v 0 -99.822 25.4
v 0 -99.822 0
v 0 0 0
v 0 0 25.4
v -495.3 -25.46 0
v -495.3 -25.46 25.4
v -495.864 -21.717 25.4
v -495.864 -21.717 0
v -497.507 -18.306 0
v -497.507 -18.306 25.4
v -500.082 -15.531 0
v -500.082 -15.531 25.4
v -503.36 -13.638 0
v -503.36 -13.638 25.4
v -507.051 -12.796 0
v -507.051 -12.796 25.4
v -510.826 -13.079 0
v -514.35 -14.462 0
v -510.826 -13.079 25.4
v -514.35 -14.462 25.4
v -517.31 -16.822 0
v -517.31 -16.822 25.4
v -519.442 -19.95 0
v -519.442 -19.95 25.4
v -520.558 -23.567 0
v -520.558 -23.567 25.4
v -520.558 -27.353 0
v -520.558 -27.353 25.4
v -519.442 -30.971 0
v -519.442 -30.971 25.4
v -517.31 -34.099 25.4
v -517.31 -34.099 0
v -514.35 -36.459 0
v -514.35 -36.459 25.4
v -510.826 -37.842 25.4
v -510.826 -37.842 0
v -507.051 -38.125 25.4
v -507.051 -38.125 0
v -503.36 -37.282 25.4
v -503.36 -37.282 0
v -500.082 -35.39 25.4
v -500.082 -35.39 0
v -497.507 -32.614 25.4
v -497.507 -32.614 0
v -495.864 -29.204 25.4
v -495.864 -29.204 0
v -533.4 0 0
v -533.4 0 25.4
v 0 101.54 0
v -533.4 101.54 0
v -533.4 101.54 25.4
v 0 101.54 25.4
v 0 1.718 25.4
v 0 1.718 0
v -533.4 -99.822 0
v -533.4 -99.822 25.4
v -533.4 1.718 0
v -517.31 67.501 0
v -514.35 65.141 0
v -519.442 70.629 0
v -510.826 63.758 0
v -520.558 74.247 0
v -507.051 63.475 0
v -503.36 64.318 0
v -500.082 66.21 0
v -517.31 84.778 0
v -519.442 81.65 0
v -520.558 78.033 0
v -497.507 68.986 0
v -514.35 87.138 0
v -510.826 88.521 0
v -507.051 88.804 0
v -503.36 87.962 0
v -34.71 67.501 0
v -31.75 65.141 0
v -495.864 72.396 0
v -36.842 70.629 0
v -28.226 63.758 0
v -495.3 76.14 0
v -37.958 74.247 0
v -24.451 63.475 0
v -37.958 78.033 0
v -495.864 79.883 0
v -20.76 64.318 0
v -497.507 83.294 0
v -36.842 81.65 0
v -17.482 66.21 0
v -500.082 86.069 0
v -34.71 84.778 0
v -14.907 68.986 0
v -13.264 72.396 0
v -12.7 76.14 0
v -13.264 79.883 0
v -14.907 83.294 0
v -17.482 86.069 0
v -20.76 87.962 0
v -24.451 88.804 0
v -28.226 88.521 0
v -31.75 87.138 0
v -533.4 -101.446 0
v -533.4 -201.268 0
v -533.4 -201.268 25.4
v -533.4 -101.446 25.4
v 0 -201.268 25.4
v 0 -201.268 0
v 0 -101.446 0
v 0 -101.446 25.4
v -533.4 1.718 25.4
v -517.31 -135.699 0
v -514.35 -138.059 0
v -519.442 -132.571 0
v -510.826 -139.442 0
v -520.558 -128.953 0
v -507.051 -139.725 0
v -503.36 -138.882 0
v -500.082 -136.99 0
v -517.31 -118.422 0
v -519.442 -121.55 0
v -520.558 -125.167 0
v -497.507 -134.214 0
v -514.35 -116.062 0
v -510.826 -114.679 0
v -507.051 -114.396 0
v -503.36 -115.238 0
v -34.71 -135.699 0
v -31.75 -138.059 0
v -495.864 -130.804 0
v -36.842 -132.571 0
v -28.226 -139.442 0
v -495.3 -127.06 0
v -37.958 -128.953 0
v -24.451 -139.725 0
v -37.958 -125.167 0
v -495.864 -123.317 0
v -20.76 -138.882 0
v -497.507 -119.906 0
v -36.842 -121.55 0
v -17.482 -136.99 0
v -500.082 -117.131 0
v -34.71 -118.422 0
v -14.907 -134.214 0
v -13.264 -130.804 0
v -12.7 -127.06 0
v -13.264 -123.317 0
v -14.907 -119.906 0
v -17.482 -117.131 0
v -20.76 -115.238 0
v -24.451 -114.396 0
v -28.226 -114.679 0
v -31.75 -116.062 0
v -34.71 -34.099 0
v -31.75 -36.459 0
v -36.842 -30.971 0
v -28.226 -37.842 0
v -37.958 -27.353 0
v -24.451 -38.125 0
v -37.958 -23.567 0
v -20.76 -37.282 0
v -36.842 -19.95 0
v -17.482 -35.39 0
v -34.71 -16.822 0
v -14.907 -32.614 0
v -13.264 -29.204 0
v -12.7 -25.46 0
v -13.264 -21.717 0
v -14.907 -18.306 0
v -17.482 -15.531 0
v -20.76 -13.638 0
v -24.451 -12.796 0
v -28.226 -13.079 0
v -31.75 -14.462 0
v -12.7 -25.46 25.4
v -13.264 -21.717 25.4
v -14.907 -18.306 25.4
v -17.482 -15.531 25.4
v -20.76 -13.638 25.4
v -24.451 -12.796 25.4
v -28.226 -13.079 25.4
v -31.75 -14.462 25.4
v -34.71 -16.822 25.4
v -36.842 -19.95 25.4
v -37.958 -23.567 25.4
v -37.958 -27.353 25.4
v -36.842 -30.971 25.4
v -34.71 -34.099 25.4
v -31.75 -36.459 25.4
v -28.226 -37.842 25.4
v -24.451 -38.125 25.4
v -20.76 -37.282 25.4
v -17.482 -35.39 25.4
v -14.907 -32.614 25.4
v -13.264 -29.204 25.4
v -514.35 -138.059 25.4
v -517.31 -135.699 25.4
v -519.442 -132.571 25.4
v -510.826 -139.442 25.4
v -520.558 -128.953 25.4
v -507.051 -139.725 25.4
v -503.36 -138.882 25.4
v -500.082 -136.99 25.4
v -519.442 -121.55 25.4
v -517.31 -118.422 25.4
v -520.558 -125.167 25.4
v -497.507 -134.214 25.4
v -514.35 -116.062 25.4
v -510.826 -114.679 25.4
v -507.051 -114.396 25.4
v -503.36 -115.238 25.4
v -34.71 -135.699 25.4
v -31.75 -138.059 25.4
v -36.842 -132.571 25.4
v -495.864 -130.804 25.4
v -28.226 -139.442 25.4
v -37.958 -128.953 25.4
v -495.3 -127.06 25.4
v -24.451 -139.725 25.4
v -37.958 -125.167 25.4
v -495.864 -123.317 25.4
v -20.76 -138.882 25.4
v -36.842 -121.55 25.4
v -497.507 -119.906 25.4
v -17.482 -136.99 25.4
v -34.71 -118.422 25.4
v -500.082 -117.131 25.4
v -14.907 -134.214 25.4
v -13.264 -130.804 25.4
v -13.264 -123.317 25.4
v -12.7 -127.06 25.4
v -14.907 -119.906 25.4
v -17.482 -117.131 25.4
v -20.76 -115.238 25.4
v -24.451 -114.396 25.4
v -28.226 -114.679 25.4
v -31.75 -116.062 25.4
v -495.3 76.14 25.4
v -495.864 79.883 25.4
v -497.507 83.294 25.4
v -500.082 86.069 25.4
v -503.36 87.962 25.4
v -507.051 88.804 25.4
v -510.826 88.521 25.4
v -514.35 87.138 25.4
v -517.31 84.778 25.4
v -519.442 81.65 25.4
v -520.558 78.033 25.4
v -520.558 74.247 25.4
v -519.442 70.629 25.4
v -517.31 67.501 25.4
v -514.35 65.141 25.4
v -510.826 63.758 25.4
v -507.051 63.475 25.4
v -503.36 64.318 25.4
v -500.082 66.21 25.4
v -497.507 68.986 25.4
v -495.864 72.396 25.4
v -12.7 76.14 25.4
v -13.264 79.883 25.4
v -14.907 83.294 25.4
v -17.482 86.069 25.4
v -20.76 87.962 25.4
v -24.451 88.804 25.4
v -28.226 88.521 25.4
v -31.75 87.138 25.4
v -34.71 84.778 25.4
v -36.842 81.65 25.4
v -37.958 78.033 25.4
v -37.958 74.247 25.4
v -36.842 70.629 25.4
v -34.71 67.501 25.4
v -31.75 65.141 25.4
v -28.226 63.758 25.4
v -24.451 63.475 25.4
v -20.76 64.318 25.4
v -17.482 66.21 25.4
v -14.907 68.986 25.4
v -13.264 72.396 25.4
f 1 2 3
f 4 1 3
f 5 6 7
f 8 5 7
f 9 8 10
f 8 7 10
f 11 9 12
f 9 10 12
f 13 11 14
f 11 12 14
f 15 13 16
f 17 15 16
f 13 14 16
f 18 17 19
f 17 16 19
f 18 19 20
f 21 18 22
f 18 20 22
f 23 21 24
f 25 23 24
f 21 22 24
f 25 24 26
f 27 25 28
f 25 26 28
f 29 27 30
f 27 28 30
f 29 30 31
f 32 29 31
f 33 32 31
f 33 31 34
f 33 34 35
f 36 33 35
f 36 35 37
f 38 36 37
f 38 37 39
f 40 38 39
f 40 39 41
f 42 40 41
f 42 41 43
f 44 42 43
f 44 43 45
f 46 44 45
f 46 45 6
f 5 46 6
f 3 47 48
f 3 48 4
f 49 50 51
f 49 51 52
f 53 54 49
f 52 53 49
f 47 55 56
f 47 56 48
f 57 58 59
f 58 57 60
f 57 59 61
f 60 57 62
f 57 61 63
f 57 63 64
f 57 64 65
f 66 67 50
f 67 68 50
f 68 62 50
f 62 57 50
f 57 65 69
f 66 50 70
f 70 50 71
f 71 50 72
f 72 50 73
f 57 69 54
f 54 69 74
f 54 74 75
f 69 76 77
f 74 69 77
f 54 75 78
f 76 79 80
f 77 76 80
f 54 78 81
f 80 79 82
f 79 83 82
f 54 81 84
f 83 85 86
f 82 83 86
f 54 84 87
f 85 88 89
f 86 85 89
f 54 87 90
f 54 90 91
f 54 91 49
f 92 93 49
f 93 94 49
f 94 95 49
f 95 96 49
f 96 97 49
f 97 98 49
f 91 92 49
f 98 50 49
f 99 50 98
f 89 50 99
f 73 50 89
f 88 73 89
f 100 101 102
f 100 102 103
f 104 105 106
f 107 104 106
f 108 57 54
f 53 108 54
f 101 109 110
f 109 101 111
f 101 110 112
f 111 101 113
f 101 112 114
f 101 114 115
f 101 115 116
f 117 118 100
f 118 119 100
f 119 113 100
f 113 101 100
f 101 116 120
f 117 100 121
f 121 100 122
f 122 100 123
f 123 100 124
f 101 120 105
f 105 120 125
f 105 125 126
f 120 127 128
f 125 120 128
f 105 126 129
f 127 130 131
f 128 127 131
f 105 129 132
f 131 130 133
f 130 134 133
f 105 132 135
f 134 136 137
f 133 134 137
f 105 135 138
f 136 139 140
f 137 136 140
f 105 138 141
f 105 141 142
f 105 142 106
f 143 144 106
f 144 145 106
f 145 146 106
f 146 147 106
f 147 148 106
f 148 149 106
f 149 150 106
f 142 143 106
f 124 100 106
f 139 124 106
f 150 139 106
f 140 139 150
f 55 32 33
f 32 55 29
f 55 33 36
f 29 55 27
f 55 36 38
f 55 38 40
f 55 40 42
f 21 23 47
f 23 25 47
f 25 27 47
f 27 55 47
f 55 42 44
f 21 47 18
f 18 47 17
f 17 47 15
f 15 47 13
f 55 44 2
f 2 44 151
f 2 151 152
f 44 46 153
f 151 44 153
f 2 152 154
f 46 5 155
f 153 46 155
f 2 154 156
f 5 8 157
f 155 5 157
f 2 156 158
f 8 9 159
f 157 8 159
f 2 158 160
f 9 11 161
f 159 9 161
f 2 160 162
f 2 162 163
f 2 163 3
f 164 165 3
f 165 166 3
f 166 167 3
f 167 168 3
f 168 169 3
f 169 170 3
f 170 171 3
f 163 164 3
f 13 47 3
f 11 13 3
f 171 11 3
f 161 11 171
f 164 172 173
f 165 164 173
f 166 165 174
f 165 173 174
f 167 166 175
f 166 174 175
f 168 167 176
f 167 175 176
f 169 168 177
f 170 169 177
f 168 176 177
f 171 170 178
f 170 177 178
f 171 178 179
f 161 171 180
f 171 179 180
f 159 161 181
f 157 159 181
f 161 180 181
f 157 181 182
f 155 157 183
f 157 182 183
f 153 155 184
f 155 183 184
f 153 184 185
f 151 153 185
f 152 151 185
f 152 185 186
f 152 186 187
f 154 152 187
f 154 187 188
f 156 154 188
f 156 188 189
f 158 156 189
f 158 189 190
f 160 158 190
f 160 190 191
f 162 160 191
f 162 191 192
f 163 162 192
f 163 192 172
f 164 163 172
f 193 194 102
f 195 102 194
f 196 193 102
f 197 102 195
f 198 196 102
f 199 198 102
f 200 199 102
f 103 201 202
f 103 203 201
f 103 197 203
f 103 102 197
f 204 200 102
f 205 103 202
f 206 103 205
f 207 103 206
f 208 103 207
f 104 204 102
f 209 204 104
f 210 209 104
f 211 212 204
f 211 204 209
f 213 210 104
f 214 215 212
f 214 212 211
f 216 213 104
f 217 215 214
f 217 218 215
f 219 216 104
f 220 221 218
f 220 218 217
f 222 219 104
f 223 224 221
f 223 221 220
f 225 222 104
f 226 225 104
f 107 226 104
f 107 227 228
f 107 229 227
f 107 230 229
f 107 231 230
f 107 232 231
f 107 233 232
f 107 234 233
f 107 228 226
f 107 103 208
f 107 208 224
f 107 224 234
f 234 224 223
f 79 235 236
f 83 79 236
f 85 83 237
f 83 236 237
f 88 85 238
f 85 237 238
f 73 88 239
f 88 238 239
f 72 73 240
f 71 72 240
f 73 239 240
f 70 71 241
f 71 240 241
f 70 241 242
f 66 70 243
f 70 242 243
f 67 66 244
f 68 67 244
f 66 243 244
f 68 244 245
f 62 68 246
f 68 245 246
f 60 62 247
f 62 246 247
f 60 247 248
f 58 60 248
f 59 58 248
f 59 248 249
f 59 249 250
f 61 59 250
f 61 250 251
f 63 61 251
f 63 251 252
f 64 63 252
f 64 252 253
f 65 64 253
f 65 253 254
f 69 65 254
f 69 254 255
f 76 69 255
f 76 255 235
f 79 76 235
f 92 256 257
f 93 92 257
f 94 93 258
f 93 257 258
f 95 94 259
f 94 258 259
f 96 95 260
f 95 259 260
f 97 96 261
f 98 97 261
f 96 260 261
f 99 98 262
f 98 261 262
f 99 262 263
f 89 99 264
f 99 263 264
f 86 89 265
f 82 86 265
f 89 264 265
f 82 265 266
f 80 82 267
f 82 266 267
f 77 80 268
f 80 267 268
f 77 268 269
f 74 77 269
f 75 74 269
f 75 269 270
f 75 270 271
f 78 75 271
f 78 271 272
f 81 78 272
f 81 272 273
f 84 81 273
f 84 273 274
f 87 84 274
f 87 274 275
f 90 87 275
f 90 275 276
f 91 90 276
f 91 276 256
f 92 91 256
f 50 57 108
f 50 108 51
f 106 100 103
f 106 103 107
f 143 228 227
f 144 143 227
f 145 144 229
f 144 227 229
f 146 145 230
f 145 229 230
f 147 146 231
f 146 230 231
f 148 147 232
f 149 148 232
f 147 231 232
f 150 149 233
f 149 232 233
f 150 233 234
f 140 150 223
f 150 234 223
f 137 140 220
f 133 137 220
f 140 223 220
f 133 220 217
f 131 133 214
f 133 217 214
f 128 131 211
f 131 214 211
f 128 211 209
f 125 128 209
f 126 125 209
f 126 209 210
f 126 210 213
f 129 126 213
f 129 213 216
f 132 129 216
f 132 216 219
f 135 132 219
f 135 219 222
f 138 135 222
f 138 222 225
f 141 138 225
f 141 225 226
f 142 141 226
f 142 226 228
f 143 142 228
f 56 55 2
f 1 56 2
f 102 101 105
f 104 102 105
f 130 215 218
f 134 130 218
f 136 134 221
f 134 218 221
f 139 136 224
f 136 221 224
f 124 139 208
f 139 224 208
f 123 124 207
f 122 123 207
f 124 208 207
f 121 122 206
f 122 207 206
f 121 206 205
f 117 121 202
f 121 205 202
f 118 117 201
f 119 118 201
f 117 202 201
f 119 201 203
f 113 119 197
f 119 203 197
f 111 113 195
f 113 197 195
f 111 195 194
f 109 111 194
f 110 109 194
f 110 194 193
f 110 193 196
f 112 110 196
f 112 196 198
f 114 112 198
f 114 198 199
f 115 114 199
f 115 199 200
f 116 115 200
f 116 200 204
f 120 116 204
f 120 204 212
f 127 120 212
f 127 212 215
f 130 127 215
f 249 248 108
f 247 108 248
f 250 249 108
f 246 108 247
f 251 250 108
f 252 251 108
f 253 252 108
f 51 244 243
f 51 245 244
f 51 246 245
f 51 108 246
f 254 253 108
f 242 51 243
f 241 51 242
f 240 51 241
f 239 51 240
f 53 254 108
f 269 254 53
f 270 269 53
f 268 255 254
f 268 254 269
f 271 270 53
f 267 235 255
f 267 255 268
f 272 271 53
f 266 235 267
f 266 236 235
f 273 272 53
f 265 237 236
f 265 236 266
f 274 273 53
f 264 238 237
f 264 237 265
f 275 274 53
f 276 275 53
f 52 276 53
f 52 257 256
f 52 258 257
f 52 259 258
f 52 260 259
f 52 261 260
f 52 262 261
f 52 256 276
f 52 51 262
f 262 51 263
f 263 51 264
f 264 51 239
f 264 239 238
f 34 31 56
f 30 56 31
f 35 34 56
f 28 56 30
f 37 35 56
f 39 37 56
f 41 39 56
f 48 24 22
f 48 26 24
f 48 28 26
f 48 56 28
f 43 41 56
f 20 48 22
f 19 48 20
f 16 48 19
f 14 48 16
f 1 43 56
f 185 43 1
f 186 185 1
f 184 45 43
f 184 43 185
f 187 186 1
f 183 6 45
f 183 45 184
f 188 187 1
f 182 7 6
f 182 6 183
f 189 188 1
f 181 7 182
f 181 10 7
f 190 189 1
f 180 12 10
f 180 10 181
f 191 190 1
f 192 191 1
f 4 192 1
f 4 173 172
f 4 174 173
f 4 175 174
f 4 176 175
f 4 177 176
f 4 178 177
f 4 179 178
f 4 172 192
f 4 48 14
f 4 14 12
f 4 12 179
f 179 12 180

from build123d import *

# Parameters (mm, degrees)
SKETCH1_W             = 533.4
SKETCH1_H             = 99.822
BOSS_EXTRUDE1_DEPTH   = 25.4
BOSS_EXTRUDE1_2_DEPTH = 25.4
BOSS_EXTRUDE1_3_DEPTH = 25.4
SKETCH2_R             = 12.7
CUT_EXTRUDE1_DEPTH    = 26.4
LPATTERN1_COUNT       = 3
LPATTERN1_PITCH       = 101.6


with BuildPart() as part:
    # Sketch1 → Boss-Extrude1 (new body)
    with BuildSketch(Plane.XY):
        with Locations((-266.7, -49.911)):
            Rectangle(SKETCH1_W, SKETCH1_H)
    extrude(amount=BOSS_EXTRUDE1_DEPTH)


with BuildPart() as body_2:
    # Sketch1 → Boss-Extrude1 2 (new body)
    with BuildSketch(Plane.XY):
        with Locations((-266.7, 51.628691072)):
            Rectangle(SKETCH1_W, SKETCH1_H)
    extrude(amount=BOSS_EXTRUDE1_2_DEPTH)

    # Sketch2 → Cut-Extrude1 (cut, through all)
    with BuildSketch(Plane.XY.offset(25.4)):
        with Locations((-508, 76.139691072)):
            Circle(SKETCH2_R)
        with Locations((-25.4, 76.139691072)):
            Circle(SKETCH2_R)
    cut_extrude1 = extrude(amount=-CUT_EXTRUDE1_DEPTH, mode=Mode.SUBTRACT)


with BuildPart() as body_3:
    # Sketch1 → Boss-Extrude1 3 (new body)
    with BuildSketch(Plane.XY):
        with Locations((-266.7, -151.356836193)):
            Rectangle(SKETCH1_W, SKETCH1_H)
    extrude(amount=BOSS_EXTRUDE1_3_DEPTH)


with BuildPart() as lpattern1_tool:
    # LPattern1: Cut-Extrude1 ×3
    with Locations(*[(0, -i * LPATTERN1_PITCH, 0) for i in range(1, LPATTERN1_COUNT)]):
        add(cut_extrude1)


with BuildPart() as part_1:
    add(part.part)

    # LPattern1: cut by lpattern1_tool
    add(lpattern1_tool.part, mode=Mode.SUBTRACT)


with BuildPart() as body_3_1:
    add(body_3.part)

    # LPattern1: cut by lpattern1_tool
    add(lpattern1_tool.part, mode=Mode.SUBTRACT)


solid = Compound([body_2.part, part_1.part, body_3_1.part])
